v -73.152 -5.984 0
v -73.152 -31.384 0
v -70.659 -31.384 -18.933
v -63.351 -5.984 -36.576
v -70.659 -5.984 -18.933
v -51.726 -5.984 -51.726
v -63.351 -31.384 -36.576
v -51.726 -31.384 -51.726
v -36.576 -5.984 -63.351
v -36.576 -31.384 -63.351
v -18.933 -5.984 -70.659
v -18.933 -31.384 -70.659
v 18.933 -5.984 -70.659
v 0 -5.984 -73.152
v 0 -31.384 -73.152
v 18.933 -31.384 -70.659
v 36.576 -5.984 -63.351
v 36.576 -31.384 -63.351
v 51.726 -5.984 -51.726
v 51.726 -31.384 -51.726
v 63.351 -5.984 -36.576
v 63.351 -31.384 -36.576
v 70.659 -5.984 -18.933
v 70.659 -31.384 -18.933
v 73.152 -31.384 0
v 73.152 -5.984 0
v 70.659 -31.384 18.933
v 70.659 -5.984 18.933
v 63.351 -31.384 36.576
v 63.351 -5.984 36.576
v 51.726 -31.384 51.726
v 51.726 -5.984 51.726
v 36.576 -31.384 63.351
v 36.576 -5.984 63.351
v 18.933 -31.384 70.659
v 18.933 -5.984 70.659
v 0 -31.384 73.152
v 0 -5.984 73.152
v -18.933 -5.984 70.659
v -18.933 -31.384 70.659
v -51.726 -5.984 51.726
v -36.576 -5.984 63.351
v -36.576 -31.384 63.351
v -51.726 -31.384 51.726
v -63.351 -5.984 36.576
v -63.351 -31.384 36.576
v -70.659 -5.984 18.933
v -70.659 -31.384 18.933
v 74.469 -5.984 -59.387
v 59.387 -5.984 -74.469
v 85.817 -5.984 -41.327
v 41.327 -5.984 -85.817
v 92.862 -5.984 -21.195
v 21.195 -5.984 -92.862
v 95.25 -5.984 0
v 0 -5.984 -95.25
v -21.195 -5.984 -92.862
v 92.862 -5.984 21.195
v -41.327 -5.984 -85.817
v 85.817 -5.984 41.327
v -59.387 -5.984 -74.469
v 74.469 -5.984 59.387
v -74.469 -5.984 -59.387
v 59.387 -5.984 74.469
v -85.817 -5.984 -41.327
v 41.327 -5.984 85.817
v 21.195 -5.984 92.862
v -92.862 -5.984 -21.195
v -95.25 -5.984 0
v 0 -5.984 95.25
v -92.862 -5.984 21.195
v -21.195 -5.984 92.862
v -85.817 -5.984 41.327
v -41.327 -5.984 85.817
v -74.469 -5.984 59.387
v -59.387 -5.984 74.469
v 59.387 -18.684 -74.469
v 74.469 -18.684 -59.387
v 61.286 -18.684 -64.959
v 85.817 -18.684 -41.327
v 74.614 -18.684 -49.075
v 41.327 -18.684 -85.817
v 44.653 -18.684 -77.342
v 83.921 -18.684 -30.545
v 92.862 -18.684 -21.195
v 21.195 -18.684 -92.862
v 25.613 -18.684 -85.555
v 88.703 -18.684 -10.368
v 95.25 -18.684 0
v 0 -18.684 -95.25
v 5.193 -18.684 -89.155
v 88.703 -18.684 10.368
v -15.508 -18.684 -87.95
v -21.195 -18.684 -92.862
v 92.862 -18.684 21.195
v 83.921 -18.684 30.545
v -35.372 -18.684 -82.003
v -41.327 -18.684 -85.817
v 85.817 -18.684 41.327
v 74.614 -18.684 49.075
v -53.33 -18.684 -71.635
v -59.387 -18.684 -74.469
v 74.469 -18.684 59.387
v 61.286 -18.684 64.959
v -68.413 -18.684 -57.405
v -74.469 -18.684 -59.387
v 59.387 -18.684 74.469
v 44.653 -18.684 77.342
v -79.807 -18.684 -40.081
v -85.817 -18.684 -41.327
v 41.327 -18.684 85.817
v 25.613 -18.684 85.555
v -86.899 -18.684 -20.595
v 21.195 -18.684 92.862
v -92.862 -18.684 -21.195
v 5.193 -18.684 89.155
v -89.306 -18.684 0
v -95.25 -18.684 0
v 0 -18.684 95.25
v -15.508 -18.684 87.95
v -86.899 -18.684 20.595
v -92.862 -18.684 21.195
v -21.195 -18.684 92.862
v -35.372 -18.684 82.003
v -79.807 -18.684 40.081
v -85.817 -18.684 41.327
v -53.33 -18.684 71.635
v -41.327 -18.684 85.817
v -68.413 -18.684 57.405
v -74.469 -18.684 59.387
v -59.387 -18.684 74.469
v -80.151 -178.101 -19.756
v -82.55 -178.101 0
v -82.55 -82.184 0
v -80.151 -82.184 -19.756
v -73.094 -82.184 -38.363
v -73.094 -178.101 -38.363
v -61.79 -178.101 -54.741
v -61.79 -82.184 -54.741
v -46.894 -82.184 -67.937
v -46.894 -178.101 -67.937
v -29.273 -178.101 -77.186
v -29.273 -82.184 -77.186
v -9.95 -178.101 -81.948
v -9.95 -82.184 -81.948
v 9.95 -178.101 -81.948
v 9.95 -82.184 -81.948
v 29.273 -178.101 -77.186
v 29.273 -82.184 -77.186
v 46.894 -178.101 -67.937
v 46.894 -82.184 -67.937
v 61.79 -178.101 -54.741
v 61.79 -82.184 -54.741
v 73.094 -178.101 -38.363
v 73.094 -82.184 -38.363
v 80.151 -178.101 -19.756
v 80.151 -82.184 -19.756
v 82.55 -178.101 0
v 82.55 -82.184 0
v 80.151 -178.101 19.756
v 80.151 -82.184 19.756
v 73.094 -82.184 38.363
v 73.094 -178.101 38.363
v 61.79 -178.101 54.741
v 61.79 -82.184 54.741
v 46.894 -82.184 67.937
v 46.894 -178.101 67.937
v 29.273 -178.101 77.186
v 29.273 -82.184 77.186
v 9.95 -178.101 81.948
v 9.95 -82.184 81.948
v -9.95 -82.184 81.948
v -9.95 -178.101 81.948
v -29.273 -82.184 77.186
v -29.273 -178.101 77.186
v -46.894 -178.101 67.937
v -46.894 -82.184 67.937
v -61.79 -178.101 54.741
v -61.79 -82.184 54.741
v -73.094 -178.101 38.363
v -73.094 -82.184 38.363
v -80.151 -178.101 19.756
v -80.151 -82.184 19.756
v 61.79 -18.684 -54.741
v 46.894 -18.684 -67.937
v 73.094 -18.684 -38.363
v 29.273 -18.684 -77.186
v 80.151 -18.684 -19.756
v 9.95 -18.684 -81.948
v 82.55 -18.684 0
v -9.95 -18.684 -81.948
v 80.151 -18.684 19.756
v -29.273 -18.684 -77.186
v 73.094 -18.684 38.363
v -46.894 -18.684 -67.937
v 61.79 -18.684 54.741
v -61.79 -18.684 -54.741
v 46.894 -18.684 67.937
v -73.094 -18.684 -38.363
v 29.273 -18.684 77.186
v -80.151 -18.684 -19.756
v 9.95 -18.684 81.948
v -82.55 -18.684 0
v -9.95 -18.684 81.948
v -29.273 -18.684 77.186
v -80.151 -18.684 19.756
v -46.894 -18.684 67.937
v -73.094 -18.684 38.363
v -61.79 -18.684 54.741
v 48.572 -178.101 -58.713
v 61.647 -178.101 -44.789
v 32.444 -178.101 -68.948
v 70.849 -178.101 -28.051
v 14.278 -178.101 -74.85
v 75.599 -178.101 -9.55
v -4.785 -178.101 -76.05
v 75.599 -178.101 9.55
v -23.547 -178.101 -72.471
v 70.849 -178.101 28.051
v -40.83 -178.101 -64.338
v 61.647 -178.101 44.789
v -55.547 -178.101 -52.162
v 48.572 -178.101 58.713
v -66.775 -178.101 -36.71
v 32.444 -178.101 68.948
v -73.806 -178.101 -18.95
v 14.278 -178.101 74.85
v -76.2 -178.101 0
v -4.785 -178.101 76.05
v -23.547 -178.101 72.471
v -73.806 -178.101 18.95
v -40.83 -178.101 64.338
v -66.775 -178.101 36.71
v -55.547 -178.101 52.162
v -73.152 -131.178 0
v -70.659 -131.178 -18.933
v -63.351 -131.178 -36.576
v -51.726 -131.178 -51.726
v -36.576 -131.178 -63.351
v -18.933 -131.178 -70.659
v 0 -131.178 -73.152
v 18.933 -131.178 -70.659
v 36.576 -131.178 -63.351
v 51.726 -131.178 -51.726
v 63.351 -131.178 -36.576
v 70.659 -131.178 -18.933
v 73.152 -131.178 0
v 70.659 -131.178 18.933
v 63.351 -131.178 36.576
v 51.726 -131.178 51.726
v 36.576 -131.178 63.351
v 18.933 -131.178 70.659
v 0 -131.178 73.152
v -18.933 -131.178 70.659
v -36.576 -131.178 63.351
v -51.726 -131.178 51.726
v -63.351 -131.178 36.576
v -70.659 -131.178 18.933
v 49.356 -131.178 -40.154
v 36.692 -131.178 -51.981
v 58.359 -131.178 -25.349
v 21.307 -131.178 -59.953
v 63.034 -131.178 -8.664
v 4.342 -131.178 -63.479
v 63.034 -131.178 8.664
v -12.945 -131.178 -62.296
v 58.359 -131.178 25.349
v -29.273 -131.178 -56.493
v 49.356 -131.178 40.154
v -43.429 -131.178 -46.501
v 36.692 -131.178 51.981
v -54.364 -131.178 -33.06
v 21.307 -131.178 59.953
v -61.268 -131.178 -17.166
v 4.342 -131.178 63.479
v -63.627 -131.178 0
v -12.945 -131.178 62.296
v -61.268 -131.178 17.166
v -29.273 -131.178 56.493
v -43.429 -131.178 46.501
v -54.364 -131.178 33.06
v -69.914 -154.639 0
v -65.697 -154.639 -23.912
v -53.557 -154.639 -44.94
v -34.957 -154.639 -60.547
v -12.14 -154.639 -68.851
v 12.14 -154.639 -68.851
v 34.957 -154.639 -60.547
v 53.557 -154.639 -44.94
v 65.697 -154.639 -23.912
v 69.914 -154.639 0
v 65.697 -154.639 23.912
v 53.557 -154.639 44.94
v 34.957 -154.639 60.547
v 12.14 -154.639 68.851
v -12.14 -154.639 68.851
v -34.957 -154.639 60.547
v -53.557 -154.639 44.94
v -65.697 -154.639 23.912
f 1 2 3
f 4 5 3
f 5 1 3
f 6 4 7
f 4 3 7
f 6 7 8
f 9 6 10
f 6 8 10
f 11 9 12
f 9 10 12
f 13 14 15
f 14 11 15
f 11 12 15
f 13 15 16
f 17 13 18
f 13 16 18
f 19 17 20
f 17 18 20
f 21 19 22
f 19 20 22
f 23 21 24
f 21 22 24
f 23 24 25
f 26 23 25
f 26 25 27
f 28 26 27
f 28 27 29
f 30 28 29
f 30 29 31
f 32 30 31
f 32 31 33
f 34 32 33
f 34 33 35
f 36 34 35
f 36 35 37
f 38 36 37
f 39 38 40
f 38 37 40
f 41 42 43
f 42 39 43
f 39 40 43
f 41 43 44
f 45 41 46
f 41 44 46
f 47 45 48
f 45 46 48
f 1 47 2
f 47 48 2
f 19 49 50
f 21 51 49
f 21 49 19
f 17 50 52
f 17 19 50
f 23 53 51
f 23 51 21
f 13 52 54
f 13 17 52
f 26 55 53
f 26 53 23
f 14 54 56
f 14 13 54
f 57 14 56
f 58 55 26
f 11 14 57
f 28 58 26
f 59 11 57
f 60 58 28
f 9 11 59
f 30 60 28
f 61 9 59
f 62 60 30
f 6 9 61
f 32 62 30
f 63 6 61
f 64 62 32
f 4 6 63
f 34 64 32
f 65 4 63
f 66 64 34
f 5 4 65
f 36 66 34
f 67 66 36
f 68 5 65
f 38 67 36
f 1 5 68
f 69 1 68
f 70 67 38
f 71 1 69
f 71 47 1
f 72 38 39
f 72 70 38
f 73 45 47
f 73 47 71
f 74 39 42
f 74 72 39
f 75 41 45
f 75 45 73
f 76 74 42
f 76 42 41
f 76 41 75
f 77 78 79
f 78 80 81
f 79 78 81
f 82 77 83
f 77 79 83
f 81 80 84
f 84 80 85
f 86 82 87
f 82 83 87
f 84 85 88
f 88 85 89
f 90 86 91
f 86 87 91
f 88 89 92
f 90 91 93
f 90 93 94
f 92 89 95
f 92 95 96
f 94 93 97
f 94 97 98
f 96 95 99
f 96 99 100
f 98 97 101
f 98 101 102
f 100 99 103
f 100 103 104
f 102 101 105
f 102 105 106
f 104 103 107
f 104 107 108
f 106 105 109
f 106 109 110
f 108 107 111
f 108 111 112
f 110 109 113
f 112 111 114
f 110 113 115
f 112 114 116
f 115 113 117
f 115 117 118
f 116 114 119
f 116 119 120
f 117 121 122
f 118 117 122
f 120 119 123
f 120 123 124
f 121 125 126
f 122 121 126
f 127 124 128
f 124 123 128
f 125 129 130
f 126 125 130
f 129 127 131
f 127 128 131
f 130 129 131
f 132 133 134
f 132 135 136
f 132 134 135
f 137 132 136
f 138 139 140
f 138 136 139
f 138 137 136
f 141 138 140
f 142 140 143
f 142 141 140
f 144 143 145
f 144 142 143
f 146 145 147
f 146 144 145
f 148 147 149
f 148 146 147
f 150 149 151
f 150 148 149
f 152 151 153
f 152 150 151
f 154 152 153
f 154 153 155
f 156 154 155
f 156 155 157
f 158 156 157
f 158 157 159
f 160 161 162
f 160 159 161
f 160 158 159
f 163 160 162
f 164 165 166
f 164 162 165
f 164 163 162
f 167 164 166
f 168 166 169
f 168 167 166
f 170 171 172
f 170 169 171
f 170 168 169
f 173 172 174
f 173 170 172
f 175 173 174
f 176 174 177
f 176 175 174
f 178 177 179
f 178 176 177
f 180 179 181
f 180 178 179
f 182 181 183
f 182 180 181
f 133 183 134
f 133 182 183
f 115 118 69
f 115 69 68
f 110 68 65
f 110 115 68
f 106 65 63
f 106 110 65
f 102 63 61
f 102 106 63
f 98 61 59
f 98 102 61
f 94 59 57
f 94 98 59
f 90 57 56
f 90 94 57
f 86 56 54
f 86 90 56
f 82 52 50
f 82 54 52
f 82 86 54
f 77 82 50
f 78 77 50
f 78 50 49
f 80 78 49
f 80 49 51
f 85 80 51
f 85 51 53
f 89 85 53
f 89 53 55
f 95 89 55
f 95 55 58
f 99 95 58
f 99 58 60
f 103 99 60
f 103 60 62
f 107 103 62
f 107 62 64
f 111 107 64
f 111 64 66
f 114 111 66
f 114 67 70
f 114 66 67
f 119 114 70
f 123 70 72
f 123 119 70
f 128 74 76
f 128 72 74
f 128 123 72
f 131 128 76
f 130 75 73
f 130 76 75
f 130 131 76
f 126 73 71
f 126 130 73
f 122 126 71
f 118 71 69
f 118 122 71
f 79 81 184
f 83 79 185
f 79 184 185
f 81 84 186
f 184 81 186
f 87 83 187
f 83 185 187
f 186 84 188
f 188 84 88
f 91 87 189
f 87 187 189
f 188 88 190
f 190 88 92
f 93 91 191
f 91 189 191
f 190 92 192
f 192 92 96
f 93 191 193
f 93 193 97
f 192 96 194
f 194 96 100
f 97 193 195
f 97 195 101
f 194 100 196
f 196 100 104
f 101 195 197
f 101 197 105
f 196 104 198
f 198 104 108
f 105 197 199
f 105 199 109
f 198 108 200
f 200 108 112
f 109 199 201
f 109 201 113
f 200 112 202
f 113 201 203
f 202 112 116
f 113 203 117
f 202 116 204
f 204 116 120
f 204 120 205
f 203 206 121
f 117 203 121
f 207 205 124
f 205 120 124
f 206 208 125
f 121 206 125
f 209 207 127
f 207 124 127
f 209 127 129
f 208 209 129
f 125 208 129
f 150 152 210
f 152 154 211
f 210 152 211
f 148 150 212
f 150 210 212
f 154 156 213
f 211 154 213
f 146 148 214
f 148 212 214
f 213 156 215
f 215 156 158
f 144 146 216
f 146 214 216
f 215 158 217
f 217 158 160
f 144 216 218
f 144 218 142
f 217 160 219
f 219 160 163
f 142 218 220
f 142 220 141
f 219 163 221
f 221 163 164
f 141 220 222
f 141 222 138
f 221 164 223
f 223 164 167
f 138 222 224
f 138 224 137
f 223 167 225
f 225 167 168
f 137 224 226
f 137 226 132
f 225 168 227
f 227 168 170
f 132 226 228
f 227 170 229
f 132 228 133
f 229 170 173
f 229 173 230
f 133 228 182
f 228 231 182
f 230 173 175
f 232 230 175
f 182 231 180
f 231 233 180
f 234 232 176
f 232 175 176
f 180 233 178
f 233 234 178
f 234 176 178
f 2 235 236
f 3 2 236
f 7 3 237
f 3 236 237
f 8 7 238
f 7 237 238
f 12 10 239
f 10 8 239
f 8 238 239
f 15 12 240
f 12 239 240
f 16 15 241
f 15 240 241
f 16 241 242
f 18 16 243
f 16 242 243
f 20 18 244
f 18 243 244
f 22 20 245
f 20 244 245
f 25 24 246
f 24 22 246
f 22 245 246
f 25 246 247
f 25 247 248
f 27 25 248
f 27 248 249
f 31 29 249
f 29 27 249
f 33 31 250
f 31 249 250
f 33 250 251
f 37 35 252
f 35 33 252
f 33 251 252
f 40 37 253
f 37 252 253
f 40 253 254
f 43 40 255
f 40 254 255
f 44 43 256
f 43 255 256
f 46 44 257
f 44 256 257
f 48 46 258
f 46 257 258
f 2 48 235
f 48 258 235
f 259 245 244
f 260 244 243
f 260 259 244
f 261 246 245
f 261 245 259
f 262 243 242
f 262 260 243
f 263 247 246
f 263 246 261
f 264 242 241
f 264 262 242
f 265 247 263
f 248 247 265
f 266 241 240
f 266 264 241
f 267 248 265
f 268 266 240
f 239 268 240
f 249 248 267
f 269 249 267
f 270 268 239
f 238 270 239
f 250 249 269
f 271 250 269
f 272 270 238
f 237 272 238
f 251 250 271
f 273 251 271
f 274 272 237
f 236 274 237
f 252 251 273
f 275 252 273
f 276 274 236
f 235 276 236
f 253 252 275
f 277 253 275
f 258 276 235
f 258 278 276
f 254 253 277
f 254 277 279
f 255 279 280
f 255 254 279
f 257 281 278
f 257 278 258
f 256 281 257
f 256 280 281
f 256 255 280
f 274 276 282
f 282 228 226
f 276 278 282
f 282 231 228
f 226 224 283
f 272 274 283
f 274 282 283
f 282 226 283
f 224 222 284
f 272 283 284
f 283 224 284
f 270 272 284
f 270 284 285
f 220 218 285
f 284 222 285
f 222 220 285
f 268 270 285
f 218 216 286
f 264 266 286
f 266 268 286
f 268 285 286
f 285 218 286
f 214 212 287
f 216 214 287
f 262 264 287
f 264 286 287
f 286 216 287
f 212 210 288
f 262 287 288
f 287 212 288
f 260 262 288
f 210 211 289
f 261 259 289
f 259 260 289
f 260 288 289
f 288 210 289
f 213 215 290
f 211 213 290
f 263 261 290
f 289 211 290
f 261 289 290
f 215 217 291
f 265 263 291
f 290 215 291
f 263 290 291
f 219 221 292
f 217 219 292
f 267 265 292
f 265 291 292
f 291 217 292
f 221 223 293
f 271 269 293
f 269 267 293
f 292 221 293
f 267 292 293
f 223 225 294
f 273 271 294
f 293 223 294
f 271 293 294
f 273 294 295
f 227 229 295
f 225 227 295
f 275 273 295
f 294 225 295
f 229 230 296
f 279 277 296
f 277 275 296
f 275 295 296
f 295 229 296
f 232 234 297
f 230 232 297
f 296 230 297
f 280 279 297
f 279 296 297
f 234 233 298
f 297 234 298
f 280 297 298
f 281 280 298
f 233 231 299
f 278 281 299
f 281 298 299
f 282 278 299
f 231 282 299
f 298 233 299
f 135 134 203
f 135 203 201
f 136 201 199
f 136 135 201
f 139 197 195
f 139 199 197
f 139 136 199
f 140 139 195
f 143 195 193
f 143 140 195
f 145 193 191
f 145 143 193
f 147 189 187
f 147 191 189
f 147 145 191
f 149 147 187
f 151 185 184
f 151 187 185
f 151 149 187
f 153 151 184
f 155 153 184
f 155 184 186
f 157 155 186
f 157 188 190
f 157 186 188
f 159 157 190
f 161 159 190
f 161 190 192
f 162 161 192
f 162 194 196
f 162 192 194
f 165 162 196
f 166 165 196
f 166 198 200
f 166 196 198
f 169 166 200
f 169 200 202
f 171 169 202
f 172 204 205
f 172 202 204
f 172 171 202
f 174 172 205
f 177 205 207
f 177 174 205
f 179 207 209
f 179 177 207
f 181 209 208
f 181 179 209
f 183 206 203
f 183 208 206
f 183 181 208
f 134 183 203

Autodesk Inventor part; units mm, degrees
ref_plane "YZ Plane" through (0, 0, 0) normal (1, 0, 0) x (0, 1, 0)
ref_plane "XZ Plane" through (0, 0, 0) normal (0, 1, 0) x (-1, 0, 0)
ref_plane "XY Plane" through (0, 0, 0) normal (0, 0, 1) x (1, 0, 0)
sketch "Sketch1" plane through (0, 0, 0) normal (0, 0, 1) x (1, 0, 0)
  arc A0 (-28.9184, -1.6435) -> (-32.3684, 5.7551) centre (-35.052, 0) ccw
  line L0 (-28.702, 47.5942) -> (-28.702, -124.4009) construction
  line L1 (-32.3684, 5.7551) -> (-88.9, 32.1162)
  line L2 (-28.9184, -1.6435) -> (-86.2301, -215.5338)
  line L3 (-46.4564, 12.3244) -> (-66.802, 12.3244)
  line L4 (-60.4508, -95.6256) -> (-54.1008, -95.6256)
  line L5 (-73.152, -5.9838) -> (-73.152, -131.1779)
  line L6 (-73.152, -131.1779) -> (-63.627, -131.1779)
  line L7 (58.5667, 38.1) -> (-194.088, 38.1) construction
  line L8 (-95.25, 6.7162) -> (-95.25, -5.9838)
  line L9 (-95.25, 6.7162) -> (-88.9, 6.7162)
  line L10 (-88.9, 6.7162) -> (-88.9, 32.1162)
  line L11 (-95.25, -5.9838) -> (-73.152, -5.9838)
  line L12 (-95.25, -5.9838) -> (-95.25, -18.6838)
  line L13 (-95.25, -18.6838) -> (-89.3064, -18.6838)
  line L14 (-89.3064, -18.6838) -> (-89.3064, -24.6274)
  line L15 (-89.3064, -24.6274) -> (-95.25, -24.6274)
  line L16 (-95.25, -24.6274) -> (-95.25, -82.1838)
  line L17 (-95.25, -82.1838) -> (-82.55, -82.1838)
  line L18 (-89.3064, -18.6838) -> (-82.55, -18.6838)
  line L19 (-82.55, -18.6838) -> (-82.55, -82.1838)
  line L20 (-95.25, -82.1838) -> (-101.6, -82.1838)
  line L21 (-66.802, 12.3244) -> (-66.802, -31.3838)
  line L22 (-66.802, -31.3838) -> (-60.4508, -95.6256)
  line L23 (-82.55, -178.1009) -> (-76.2, -178.1009)
  line L24 (-82.55, -82.1838) -> (-82.55, -178.1009)
  line L25 (-86.2301, -215.5338) -> (-89.4051, -215.5338)
  line L26 (-89.4051, -215.5338) -> (-101.6, -82.1838)
  line L27 (-69.977, -5.9838) -> (-69.977, -31.3838)
  line L28 (-69.977, -31.3838) -> (-73.152, -31.3838)
  line L29 (-69.977, -5.9838) -> (-66.802, -5.9838)
  line L30 (-101.6, -82.1838) -> (-28.702, -82.1838) construction
  line L31 (0, -210.5351) -> (0, 86.485) construction
  point P0 (0, 0)
  dimension "d0" = 12.7
  dimension "d1" = 28.702
  dimension "d3" = 15
  dimension "d4" = 6.35
  dimension "d9" = 38.1
  dimension "d11" = 12.7
  dimension "d13" = 95.25
  dimension "d14" = 6.35
  dimension "d15" = 25.4
  dimension "d17" = 12.7
  dimension "d18" = 5.9436
  dimension "d19" = 5.9436
  dimension "d20" = 12.7
  dimension "d22" = 107.95
  dimension "d23" = 63.5
  dimension "d25" = 25.4
  dimension "d26" = 6.35
  dimension "d27" = 133.35
  dimension "d28" = 3.175
  dimension "d29" = 101.6
  dimension "d30" = 6.35
  dimension "d31" = 25
  dimension "d32" = 44.45
  dimension "d33" = 3.175
  dimension "d34" = 20.3456
  dimension "d35" = 9.525
revolve "Revolution1" add sketch "Sketch1" angle 360 about axis through (0, -210.5351, 0) along (0, 1, 0) contours L2 L23 L24 L19 L18 L13 L12 L11 L5 L6
properties part number "aluminum_carrier" material "Aluminum 6061"
